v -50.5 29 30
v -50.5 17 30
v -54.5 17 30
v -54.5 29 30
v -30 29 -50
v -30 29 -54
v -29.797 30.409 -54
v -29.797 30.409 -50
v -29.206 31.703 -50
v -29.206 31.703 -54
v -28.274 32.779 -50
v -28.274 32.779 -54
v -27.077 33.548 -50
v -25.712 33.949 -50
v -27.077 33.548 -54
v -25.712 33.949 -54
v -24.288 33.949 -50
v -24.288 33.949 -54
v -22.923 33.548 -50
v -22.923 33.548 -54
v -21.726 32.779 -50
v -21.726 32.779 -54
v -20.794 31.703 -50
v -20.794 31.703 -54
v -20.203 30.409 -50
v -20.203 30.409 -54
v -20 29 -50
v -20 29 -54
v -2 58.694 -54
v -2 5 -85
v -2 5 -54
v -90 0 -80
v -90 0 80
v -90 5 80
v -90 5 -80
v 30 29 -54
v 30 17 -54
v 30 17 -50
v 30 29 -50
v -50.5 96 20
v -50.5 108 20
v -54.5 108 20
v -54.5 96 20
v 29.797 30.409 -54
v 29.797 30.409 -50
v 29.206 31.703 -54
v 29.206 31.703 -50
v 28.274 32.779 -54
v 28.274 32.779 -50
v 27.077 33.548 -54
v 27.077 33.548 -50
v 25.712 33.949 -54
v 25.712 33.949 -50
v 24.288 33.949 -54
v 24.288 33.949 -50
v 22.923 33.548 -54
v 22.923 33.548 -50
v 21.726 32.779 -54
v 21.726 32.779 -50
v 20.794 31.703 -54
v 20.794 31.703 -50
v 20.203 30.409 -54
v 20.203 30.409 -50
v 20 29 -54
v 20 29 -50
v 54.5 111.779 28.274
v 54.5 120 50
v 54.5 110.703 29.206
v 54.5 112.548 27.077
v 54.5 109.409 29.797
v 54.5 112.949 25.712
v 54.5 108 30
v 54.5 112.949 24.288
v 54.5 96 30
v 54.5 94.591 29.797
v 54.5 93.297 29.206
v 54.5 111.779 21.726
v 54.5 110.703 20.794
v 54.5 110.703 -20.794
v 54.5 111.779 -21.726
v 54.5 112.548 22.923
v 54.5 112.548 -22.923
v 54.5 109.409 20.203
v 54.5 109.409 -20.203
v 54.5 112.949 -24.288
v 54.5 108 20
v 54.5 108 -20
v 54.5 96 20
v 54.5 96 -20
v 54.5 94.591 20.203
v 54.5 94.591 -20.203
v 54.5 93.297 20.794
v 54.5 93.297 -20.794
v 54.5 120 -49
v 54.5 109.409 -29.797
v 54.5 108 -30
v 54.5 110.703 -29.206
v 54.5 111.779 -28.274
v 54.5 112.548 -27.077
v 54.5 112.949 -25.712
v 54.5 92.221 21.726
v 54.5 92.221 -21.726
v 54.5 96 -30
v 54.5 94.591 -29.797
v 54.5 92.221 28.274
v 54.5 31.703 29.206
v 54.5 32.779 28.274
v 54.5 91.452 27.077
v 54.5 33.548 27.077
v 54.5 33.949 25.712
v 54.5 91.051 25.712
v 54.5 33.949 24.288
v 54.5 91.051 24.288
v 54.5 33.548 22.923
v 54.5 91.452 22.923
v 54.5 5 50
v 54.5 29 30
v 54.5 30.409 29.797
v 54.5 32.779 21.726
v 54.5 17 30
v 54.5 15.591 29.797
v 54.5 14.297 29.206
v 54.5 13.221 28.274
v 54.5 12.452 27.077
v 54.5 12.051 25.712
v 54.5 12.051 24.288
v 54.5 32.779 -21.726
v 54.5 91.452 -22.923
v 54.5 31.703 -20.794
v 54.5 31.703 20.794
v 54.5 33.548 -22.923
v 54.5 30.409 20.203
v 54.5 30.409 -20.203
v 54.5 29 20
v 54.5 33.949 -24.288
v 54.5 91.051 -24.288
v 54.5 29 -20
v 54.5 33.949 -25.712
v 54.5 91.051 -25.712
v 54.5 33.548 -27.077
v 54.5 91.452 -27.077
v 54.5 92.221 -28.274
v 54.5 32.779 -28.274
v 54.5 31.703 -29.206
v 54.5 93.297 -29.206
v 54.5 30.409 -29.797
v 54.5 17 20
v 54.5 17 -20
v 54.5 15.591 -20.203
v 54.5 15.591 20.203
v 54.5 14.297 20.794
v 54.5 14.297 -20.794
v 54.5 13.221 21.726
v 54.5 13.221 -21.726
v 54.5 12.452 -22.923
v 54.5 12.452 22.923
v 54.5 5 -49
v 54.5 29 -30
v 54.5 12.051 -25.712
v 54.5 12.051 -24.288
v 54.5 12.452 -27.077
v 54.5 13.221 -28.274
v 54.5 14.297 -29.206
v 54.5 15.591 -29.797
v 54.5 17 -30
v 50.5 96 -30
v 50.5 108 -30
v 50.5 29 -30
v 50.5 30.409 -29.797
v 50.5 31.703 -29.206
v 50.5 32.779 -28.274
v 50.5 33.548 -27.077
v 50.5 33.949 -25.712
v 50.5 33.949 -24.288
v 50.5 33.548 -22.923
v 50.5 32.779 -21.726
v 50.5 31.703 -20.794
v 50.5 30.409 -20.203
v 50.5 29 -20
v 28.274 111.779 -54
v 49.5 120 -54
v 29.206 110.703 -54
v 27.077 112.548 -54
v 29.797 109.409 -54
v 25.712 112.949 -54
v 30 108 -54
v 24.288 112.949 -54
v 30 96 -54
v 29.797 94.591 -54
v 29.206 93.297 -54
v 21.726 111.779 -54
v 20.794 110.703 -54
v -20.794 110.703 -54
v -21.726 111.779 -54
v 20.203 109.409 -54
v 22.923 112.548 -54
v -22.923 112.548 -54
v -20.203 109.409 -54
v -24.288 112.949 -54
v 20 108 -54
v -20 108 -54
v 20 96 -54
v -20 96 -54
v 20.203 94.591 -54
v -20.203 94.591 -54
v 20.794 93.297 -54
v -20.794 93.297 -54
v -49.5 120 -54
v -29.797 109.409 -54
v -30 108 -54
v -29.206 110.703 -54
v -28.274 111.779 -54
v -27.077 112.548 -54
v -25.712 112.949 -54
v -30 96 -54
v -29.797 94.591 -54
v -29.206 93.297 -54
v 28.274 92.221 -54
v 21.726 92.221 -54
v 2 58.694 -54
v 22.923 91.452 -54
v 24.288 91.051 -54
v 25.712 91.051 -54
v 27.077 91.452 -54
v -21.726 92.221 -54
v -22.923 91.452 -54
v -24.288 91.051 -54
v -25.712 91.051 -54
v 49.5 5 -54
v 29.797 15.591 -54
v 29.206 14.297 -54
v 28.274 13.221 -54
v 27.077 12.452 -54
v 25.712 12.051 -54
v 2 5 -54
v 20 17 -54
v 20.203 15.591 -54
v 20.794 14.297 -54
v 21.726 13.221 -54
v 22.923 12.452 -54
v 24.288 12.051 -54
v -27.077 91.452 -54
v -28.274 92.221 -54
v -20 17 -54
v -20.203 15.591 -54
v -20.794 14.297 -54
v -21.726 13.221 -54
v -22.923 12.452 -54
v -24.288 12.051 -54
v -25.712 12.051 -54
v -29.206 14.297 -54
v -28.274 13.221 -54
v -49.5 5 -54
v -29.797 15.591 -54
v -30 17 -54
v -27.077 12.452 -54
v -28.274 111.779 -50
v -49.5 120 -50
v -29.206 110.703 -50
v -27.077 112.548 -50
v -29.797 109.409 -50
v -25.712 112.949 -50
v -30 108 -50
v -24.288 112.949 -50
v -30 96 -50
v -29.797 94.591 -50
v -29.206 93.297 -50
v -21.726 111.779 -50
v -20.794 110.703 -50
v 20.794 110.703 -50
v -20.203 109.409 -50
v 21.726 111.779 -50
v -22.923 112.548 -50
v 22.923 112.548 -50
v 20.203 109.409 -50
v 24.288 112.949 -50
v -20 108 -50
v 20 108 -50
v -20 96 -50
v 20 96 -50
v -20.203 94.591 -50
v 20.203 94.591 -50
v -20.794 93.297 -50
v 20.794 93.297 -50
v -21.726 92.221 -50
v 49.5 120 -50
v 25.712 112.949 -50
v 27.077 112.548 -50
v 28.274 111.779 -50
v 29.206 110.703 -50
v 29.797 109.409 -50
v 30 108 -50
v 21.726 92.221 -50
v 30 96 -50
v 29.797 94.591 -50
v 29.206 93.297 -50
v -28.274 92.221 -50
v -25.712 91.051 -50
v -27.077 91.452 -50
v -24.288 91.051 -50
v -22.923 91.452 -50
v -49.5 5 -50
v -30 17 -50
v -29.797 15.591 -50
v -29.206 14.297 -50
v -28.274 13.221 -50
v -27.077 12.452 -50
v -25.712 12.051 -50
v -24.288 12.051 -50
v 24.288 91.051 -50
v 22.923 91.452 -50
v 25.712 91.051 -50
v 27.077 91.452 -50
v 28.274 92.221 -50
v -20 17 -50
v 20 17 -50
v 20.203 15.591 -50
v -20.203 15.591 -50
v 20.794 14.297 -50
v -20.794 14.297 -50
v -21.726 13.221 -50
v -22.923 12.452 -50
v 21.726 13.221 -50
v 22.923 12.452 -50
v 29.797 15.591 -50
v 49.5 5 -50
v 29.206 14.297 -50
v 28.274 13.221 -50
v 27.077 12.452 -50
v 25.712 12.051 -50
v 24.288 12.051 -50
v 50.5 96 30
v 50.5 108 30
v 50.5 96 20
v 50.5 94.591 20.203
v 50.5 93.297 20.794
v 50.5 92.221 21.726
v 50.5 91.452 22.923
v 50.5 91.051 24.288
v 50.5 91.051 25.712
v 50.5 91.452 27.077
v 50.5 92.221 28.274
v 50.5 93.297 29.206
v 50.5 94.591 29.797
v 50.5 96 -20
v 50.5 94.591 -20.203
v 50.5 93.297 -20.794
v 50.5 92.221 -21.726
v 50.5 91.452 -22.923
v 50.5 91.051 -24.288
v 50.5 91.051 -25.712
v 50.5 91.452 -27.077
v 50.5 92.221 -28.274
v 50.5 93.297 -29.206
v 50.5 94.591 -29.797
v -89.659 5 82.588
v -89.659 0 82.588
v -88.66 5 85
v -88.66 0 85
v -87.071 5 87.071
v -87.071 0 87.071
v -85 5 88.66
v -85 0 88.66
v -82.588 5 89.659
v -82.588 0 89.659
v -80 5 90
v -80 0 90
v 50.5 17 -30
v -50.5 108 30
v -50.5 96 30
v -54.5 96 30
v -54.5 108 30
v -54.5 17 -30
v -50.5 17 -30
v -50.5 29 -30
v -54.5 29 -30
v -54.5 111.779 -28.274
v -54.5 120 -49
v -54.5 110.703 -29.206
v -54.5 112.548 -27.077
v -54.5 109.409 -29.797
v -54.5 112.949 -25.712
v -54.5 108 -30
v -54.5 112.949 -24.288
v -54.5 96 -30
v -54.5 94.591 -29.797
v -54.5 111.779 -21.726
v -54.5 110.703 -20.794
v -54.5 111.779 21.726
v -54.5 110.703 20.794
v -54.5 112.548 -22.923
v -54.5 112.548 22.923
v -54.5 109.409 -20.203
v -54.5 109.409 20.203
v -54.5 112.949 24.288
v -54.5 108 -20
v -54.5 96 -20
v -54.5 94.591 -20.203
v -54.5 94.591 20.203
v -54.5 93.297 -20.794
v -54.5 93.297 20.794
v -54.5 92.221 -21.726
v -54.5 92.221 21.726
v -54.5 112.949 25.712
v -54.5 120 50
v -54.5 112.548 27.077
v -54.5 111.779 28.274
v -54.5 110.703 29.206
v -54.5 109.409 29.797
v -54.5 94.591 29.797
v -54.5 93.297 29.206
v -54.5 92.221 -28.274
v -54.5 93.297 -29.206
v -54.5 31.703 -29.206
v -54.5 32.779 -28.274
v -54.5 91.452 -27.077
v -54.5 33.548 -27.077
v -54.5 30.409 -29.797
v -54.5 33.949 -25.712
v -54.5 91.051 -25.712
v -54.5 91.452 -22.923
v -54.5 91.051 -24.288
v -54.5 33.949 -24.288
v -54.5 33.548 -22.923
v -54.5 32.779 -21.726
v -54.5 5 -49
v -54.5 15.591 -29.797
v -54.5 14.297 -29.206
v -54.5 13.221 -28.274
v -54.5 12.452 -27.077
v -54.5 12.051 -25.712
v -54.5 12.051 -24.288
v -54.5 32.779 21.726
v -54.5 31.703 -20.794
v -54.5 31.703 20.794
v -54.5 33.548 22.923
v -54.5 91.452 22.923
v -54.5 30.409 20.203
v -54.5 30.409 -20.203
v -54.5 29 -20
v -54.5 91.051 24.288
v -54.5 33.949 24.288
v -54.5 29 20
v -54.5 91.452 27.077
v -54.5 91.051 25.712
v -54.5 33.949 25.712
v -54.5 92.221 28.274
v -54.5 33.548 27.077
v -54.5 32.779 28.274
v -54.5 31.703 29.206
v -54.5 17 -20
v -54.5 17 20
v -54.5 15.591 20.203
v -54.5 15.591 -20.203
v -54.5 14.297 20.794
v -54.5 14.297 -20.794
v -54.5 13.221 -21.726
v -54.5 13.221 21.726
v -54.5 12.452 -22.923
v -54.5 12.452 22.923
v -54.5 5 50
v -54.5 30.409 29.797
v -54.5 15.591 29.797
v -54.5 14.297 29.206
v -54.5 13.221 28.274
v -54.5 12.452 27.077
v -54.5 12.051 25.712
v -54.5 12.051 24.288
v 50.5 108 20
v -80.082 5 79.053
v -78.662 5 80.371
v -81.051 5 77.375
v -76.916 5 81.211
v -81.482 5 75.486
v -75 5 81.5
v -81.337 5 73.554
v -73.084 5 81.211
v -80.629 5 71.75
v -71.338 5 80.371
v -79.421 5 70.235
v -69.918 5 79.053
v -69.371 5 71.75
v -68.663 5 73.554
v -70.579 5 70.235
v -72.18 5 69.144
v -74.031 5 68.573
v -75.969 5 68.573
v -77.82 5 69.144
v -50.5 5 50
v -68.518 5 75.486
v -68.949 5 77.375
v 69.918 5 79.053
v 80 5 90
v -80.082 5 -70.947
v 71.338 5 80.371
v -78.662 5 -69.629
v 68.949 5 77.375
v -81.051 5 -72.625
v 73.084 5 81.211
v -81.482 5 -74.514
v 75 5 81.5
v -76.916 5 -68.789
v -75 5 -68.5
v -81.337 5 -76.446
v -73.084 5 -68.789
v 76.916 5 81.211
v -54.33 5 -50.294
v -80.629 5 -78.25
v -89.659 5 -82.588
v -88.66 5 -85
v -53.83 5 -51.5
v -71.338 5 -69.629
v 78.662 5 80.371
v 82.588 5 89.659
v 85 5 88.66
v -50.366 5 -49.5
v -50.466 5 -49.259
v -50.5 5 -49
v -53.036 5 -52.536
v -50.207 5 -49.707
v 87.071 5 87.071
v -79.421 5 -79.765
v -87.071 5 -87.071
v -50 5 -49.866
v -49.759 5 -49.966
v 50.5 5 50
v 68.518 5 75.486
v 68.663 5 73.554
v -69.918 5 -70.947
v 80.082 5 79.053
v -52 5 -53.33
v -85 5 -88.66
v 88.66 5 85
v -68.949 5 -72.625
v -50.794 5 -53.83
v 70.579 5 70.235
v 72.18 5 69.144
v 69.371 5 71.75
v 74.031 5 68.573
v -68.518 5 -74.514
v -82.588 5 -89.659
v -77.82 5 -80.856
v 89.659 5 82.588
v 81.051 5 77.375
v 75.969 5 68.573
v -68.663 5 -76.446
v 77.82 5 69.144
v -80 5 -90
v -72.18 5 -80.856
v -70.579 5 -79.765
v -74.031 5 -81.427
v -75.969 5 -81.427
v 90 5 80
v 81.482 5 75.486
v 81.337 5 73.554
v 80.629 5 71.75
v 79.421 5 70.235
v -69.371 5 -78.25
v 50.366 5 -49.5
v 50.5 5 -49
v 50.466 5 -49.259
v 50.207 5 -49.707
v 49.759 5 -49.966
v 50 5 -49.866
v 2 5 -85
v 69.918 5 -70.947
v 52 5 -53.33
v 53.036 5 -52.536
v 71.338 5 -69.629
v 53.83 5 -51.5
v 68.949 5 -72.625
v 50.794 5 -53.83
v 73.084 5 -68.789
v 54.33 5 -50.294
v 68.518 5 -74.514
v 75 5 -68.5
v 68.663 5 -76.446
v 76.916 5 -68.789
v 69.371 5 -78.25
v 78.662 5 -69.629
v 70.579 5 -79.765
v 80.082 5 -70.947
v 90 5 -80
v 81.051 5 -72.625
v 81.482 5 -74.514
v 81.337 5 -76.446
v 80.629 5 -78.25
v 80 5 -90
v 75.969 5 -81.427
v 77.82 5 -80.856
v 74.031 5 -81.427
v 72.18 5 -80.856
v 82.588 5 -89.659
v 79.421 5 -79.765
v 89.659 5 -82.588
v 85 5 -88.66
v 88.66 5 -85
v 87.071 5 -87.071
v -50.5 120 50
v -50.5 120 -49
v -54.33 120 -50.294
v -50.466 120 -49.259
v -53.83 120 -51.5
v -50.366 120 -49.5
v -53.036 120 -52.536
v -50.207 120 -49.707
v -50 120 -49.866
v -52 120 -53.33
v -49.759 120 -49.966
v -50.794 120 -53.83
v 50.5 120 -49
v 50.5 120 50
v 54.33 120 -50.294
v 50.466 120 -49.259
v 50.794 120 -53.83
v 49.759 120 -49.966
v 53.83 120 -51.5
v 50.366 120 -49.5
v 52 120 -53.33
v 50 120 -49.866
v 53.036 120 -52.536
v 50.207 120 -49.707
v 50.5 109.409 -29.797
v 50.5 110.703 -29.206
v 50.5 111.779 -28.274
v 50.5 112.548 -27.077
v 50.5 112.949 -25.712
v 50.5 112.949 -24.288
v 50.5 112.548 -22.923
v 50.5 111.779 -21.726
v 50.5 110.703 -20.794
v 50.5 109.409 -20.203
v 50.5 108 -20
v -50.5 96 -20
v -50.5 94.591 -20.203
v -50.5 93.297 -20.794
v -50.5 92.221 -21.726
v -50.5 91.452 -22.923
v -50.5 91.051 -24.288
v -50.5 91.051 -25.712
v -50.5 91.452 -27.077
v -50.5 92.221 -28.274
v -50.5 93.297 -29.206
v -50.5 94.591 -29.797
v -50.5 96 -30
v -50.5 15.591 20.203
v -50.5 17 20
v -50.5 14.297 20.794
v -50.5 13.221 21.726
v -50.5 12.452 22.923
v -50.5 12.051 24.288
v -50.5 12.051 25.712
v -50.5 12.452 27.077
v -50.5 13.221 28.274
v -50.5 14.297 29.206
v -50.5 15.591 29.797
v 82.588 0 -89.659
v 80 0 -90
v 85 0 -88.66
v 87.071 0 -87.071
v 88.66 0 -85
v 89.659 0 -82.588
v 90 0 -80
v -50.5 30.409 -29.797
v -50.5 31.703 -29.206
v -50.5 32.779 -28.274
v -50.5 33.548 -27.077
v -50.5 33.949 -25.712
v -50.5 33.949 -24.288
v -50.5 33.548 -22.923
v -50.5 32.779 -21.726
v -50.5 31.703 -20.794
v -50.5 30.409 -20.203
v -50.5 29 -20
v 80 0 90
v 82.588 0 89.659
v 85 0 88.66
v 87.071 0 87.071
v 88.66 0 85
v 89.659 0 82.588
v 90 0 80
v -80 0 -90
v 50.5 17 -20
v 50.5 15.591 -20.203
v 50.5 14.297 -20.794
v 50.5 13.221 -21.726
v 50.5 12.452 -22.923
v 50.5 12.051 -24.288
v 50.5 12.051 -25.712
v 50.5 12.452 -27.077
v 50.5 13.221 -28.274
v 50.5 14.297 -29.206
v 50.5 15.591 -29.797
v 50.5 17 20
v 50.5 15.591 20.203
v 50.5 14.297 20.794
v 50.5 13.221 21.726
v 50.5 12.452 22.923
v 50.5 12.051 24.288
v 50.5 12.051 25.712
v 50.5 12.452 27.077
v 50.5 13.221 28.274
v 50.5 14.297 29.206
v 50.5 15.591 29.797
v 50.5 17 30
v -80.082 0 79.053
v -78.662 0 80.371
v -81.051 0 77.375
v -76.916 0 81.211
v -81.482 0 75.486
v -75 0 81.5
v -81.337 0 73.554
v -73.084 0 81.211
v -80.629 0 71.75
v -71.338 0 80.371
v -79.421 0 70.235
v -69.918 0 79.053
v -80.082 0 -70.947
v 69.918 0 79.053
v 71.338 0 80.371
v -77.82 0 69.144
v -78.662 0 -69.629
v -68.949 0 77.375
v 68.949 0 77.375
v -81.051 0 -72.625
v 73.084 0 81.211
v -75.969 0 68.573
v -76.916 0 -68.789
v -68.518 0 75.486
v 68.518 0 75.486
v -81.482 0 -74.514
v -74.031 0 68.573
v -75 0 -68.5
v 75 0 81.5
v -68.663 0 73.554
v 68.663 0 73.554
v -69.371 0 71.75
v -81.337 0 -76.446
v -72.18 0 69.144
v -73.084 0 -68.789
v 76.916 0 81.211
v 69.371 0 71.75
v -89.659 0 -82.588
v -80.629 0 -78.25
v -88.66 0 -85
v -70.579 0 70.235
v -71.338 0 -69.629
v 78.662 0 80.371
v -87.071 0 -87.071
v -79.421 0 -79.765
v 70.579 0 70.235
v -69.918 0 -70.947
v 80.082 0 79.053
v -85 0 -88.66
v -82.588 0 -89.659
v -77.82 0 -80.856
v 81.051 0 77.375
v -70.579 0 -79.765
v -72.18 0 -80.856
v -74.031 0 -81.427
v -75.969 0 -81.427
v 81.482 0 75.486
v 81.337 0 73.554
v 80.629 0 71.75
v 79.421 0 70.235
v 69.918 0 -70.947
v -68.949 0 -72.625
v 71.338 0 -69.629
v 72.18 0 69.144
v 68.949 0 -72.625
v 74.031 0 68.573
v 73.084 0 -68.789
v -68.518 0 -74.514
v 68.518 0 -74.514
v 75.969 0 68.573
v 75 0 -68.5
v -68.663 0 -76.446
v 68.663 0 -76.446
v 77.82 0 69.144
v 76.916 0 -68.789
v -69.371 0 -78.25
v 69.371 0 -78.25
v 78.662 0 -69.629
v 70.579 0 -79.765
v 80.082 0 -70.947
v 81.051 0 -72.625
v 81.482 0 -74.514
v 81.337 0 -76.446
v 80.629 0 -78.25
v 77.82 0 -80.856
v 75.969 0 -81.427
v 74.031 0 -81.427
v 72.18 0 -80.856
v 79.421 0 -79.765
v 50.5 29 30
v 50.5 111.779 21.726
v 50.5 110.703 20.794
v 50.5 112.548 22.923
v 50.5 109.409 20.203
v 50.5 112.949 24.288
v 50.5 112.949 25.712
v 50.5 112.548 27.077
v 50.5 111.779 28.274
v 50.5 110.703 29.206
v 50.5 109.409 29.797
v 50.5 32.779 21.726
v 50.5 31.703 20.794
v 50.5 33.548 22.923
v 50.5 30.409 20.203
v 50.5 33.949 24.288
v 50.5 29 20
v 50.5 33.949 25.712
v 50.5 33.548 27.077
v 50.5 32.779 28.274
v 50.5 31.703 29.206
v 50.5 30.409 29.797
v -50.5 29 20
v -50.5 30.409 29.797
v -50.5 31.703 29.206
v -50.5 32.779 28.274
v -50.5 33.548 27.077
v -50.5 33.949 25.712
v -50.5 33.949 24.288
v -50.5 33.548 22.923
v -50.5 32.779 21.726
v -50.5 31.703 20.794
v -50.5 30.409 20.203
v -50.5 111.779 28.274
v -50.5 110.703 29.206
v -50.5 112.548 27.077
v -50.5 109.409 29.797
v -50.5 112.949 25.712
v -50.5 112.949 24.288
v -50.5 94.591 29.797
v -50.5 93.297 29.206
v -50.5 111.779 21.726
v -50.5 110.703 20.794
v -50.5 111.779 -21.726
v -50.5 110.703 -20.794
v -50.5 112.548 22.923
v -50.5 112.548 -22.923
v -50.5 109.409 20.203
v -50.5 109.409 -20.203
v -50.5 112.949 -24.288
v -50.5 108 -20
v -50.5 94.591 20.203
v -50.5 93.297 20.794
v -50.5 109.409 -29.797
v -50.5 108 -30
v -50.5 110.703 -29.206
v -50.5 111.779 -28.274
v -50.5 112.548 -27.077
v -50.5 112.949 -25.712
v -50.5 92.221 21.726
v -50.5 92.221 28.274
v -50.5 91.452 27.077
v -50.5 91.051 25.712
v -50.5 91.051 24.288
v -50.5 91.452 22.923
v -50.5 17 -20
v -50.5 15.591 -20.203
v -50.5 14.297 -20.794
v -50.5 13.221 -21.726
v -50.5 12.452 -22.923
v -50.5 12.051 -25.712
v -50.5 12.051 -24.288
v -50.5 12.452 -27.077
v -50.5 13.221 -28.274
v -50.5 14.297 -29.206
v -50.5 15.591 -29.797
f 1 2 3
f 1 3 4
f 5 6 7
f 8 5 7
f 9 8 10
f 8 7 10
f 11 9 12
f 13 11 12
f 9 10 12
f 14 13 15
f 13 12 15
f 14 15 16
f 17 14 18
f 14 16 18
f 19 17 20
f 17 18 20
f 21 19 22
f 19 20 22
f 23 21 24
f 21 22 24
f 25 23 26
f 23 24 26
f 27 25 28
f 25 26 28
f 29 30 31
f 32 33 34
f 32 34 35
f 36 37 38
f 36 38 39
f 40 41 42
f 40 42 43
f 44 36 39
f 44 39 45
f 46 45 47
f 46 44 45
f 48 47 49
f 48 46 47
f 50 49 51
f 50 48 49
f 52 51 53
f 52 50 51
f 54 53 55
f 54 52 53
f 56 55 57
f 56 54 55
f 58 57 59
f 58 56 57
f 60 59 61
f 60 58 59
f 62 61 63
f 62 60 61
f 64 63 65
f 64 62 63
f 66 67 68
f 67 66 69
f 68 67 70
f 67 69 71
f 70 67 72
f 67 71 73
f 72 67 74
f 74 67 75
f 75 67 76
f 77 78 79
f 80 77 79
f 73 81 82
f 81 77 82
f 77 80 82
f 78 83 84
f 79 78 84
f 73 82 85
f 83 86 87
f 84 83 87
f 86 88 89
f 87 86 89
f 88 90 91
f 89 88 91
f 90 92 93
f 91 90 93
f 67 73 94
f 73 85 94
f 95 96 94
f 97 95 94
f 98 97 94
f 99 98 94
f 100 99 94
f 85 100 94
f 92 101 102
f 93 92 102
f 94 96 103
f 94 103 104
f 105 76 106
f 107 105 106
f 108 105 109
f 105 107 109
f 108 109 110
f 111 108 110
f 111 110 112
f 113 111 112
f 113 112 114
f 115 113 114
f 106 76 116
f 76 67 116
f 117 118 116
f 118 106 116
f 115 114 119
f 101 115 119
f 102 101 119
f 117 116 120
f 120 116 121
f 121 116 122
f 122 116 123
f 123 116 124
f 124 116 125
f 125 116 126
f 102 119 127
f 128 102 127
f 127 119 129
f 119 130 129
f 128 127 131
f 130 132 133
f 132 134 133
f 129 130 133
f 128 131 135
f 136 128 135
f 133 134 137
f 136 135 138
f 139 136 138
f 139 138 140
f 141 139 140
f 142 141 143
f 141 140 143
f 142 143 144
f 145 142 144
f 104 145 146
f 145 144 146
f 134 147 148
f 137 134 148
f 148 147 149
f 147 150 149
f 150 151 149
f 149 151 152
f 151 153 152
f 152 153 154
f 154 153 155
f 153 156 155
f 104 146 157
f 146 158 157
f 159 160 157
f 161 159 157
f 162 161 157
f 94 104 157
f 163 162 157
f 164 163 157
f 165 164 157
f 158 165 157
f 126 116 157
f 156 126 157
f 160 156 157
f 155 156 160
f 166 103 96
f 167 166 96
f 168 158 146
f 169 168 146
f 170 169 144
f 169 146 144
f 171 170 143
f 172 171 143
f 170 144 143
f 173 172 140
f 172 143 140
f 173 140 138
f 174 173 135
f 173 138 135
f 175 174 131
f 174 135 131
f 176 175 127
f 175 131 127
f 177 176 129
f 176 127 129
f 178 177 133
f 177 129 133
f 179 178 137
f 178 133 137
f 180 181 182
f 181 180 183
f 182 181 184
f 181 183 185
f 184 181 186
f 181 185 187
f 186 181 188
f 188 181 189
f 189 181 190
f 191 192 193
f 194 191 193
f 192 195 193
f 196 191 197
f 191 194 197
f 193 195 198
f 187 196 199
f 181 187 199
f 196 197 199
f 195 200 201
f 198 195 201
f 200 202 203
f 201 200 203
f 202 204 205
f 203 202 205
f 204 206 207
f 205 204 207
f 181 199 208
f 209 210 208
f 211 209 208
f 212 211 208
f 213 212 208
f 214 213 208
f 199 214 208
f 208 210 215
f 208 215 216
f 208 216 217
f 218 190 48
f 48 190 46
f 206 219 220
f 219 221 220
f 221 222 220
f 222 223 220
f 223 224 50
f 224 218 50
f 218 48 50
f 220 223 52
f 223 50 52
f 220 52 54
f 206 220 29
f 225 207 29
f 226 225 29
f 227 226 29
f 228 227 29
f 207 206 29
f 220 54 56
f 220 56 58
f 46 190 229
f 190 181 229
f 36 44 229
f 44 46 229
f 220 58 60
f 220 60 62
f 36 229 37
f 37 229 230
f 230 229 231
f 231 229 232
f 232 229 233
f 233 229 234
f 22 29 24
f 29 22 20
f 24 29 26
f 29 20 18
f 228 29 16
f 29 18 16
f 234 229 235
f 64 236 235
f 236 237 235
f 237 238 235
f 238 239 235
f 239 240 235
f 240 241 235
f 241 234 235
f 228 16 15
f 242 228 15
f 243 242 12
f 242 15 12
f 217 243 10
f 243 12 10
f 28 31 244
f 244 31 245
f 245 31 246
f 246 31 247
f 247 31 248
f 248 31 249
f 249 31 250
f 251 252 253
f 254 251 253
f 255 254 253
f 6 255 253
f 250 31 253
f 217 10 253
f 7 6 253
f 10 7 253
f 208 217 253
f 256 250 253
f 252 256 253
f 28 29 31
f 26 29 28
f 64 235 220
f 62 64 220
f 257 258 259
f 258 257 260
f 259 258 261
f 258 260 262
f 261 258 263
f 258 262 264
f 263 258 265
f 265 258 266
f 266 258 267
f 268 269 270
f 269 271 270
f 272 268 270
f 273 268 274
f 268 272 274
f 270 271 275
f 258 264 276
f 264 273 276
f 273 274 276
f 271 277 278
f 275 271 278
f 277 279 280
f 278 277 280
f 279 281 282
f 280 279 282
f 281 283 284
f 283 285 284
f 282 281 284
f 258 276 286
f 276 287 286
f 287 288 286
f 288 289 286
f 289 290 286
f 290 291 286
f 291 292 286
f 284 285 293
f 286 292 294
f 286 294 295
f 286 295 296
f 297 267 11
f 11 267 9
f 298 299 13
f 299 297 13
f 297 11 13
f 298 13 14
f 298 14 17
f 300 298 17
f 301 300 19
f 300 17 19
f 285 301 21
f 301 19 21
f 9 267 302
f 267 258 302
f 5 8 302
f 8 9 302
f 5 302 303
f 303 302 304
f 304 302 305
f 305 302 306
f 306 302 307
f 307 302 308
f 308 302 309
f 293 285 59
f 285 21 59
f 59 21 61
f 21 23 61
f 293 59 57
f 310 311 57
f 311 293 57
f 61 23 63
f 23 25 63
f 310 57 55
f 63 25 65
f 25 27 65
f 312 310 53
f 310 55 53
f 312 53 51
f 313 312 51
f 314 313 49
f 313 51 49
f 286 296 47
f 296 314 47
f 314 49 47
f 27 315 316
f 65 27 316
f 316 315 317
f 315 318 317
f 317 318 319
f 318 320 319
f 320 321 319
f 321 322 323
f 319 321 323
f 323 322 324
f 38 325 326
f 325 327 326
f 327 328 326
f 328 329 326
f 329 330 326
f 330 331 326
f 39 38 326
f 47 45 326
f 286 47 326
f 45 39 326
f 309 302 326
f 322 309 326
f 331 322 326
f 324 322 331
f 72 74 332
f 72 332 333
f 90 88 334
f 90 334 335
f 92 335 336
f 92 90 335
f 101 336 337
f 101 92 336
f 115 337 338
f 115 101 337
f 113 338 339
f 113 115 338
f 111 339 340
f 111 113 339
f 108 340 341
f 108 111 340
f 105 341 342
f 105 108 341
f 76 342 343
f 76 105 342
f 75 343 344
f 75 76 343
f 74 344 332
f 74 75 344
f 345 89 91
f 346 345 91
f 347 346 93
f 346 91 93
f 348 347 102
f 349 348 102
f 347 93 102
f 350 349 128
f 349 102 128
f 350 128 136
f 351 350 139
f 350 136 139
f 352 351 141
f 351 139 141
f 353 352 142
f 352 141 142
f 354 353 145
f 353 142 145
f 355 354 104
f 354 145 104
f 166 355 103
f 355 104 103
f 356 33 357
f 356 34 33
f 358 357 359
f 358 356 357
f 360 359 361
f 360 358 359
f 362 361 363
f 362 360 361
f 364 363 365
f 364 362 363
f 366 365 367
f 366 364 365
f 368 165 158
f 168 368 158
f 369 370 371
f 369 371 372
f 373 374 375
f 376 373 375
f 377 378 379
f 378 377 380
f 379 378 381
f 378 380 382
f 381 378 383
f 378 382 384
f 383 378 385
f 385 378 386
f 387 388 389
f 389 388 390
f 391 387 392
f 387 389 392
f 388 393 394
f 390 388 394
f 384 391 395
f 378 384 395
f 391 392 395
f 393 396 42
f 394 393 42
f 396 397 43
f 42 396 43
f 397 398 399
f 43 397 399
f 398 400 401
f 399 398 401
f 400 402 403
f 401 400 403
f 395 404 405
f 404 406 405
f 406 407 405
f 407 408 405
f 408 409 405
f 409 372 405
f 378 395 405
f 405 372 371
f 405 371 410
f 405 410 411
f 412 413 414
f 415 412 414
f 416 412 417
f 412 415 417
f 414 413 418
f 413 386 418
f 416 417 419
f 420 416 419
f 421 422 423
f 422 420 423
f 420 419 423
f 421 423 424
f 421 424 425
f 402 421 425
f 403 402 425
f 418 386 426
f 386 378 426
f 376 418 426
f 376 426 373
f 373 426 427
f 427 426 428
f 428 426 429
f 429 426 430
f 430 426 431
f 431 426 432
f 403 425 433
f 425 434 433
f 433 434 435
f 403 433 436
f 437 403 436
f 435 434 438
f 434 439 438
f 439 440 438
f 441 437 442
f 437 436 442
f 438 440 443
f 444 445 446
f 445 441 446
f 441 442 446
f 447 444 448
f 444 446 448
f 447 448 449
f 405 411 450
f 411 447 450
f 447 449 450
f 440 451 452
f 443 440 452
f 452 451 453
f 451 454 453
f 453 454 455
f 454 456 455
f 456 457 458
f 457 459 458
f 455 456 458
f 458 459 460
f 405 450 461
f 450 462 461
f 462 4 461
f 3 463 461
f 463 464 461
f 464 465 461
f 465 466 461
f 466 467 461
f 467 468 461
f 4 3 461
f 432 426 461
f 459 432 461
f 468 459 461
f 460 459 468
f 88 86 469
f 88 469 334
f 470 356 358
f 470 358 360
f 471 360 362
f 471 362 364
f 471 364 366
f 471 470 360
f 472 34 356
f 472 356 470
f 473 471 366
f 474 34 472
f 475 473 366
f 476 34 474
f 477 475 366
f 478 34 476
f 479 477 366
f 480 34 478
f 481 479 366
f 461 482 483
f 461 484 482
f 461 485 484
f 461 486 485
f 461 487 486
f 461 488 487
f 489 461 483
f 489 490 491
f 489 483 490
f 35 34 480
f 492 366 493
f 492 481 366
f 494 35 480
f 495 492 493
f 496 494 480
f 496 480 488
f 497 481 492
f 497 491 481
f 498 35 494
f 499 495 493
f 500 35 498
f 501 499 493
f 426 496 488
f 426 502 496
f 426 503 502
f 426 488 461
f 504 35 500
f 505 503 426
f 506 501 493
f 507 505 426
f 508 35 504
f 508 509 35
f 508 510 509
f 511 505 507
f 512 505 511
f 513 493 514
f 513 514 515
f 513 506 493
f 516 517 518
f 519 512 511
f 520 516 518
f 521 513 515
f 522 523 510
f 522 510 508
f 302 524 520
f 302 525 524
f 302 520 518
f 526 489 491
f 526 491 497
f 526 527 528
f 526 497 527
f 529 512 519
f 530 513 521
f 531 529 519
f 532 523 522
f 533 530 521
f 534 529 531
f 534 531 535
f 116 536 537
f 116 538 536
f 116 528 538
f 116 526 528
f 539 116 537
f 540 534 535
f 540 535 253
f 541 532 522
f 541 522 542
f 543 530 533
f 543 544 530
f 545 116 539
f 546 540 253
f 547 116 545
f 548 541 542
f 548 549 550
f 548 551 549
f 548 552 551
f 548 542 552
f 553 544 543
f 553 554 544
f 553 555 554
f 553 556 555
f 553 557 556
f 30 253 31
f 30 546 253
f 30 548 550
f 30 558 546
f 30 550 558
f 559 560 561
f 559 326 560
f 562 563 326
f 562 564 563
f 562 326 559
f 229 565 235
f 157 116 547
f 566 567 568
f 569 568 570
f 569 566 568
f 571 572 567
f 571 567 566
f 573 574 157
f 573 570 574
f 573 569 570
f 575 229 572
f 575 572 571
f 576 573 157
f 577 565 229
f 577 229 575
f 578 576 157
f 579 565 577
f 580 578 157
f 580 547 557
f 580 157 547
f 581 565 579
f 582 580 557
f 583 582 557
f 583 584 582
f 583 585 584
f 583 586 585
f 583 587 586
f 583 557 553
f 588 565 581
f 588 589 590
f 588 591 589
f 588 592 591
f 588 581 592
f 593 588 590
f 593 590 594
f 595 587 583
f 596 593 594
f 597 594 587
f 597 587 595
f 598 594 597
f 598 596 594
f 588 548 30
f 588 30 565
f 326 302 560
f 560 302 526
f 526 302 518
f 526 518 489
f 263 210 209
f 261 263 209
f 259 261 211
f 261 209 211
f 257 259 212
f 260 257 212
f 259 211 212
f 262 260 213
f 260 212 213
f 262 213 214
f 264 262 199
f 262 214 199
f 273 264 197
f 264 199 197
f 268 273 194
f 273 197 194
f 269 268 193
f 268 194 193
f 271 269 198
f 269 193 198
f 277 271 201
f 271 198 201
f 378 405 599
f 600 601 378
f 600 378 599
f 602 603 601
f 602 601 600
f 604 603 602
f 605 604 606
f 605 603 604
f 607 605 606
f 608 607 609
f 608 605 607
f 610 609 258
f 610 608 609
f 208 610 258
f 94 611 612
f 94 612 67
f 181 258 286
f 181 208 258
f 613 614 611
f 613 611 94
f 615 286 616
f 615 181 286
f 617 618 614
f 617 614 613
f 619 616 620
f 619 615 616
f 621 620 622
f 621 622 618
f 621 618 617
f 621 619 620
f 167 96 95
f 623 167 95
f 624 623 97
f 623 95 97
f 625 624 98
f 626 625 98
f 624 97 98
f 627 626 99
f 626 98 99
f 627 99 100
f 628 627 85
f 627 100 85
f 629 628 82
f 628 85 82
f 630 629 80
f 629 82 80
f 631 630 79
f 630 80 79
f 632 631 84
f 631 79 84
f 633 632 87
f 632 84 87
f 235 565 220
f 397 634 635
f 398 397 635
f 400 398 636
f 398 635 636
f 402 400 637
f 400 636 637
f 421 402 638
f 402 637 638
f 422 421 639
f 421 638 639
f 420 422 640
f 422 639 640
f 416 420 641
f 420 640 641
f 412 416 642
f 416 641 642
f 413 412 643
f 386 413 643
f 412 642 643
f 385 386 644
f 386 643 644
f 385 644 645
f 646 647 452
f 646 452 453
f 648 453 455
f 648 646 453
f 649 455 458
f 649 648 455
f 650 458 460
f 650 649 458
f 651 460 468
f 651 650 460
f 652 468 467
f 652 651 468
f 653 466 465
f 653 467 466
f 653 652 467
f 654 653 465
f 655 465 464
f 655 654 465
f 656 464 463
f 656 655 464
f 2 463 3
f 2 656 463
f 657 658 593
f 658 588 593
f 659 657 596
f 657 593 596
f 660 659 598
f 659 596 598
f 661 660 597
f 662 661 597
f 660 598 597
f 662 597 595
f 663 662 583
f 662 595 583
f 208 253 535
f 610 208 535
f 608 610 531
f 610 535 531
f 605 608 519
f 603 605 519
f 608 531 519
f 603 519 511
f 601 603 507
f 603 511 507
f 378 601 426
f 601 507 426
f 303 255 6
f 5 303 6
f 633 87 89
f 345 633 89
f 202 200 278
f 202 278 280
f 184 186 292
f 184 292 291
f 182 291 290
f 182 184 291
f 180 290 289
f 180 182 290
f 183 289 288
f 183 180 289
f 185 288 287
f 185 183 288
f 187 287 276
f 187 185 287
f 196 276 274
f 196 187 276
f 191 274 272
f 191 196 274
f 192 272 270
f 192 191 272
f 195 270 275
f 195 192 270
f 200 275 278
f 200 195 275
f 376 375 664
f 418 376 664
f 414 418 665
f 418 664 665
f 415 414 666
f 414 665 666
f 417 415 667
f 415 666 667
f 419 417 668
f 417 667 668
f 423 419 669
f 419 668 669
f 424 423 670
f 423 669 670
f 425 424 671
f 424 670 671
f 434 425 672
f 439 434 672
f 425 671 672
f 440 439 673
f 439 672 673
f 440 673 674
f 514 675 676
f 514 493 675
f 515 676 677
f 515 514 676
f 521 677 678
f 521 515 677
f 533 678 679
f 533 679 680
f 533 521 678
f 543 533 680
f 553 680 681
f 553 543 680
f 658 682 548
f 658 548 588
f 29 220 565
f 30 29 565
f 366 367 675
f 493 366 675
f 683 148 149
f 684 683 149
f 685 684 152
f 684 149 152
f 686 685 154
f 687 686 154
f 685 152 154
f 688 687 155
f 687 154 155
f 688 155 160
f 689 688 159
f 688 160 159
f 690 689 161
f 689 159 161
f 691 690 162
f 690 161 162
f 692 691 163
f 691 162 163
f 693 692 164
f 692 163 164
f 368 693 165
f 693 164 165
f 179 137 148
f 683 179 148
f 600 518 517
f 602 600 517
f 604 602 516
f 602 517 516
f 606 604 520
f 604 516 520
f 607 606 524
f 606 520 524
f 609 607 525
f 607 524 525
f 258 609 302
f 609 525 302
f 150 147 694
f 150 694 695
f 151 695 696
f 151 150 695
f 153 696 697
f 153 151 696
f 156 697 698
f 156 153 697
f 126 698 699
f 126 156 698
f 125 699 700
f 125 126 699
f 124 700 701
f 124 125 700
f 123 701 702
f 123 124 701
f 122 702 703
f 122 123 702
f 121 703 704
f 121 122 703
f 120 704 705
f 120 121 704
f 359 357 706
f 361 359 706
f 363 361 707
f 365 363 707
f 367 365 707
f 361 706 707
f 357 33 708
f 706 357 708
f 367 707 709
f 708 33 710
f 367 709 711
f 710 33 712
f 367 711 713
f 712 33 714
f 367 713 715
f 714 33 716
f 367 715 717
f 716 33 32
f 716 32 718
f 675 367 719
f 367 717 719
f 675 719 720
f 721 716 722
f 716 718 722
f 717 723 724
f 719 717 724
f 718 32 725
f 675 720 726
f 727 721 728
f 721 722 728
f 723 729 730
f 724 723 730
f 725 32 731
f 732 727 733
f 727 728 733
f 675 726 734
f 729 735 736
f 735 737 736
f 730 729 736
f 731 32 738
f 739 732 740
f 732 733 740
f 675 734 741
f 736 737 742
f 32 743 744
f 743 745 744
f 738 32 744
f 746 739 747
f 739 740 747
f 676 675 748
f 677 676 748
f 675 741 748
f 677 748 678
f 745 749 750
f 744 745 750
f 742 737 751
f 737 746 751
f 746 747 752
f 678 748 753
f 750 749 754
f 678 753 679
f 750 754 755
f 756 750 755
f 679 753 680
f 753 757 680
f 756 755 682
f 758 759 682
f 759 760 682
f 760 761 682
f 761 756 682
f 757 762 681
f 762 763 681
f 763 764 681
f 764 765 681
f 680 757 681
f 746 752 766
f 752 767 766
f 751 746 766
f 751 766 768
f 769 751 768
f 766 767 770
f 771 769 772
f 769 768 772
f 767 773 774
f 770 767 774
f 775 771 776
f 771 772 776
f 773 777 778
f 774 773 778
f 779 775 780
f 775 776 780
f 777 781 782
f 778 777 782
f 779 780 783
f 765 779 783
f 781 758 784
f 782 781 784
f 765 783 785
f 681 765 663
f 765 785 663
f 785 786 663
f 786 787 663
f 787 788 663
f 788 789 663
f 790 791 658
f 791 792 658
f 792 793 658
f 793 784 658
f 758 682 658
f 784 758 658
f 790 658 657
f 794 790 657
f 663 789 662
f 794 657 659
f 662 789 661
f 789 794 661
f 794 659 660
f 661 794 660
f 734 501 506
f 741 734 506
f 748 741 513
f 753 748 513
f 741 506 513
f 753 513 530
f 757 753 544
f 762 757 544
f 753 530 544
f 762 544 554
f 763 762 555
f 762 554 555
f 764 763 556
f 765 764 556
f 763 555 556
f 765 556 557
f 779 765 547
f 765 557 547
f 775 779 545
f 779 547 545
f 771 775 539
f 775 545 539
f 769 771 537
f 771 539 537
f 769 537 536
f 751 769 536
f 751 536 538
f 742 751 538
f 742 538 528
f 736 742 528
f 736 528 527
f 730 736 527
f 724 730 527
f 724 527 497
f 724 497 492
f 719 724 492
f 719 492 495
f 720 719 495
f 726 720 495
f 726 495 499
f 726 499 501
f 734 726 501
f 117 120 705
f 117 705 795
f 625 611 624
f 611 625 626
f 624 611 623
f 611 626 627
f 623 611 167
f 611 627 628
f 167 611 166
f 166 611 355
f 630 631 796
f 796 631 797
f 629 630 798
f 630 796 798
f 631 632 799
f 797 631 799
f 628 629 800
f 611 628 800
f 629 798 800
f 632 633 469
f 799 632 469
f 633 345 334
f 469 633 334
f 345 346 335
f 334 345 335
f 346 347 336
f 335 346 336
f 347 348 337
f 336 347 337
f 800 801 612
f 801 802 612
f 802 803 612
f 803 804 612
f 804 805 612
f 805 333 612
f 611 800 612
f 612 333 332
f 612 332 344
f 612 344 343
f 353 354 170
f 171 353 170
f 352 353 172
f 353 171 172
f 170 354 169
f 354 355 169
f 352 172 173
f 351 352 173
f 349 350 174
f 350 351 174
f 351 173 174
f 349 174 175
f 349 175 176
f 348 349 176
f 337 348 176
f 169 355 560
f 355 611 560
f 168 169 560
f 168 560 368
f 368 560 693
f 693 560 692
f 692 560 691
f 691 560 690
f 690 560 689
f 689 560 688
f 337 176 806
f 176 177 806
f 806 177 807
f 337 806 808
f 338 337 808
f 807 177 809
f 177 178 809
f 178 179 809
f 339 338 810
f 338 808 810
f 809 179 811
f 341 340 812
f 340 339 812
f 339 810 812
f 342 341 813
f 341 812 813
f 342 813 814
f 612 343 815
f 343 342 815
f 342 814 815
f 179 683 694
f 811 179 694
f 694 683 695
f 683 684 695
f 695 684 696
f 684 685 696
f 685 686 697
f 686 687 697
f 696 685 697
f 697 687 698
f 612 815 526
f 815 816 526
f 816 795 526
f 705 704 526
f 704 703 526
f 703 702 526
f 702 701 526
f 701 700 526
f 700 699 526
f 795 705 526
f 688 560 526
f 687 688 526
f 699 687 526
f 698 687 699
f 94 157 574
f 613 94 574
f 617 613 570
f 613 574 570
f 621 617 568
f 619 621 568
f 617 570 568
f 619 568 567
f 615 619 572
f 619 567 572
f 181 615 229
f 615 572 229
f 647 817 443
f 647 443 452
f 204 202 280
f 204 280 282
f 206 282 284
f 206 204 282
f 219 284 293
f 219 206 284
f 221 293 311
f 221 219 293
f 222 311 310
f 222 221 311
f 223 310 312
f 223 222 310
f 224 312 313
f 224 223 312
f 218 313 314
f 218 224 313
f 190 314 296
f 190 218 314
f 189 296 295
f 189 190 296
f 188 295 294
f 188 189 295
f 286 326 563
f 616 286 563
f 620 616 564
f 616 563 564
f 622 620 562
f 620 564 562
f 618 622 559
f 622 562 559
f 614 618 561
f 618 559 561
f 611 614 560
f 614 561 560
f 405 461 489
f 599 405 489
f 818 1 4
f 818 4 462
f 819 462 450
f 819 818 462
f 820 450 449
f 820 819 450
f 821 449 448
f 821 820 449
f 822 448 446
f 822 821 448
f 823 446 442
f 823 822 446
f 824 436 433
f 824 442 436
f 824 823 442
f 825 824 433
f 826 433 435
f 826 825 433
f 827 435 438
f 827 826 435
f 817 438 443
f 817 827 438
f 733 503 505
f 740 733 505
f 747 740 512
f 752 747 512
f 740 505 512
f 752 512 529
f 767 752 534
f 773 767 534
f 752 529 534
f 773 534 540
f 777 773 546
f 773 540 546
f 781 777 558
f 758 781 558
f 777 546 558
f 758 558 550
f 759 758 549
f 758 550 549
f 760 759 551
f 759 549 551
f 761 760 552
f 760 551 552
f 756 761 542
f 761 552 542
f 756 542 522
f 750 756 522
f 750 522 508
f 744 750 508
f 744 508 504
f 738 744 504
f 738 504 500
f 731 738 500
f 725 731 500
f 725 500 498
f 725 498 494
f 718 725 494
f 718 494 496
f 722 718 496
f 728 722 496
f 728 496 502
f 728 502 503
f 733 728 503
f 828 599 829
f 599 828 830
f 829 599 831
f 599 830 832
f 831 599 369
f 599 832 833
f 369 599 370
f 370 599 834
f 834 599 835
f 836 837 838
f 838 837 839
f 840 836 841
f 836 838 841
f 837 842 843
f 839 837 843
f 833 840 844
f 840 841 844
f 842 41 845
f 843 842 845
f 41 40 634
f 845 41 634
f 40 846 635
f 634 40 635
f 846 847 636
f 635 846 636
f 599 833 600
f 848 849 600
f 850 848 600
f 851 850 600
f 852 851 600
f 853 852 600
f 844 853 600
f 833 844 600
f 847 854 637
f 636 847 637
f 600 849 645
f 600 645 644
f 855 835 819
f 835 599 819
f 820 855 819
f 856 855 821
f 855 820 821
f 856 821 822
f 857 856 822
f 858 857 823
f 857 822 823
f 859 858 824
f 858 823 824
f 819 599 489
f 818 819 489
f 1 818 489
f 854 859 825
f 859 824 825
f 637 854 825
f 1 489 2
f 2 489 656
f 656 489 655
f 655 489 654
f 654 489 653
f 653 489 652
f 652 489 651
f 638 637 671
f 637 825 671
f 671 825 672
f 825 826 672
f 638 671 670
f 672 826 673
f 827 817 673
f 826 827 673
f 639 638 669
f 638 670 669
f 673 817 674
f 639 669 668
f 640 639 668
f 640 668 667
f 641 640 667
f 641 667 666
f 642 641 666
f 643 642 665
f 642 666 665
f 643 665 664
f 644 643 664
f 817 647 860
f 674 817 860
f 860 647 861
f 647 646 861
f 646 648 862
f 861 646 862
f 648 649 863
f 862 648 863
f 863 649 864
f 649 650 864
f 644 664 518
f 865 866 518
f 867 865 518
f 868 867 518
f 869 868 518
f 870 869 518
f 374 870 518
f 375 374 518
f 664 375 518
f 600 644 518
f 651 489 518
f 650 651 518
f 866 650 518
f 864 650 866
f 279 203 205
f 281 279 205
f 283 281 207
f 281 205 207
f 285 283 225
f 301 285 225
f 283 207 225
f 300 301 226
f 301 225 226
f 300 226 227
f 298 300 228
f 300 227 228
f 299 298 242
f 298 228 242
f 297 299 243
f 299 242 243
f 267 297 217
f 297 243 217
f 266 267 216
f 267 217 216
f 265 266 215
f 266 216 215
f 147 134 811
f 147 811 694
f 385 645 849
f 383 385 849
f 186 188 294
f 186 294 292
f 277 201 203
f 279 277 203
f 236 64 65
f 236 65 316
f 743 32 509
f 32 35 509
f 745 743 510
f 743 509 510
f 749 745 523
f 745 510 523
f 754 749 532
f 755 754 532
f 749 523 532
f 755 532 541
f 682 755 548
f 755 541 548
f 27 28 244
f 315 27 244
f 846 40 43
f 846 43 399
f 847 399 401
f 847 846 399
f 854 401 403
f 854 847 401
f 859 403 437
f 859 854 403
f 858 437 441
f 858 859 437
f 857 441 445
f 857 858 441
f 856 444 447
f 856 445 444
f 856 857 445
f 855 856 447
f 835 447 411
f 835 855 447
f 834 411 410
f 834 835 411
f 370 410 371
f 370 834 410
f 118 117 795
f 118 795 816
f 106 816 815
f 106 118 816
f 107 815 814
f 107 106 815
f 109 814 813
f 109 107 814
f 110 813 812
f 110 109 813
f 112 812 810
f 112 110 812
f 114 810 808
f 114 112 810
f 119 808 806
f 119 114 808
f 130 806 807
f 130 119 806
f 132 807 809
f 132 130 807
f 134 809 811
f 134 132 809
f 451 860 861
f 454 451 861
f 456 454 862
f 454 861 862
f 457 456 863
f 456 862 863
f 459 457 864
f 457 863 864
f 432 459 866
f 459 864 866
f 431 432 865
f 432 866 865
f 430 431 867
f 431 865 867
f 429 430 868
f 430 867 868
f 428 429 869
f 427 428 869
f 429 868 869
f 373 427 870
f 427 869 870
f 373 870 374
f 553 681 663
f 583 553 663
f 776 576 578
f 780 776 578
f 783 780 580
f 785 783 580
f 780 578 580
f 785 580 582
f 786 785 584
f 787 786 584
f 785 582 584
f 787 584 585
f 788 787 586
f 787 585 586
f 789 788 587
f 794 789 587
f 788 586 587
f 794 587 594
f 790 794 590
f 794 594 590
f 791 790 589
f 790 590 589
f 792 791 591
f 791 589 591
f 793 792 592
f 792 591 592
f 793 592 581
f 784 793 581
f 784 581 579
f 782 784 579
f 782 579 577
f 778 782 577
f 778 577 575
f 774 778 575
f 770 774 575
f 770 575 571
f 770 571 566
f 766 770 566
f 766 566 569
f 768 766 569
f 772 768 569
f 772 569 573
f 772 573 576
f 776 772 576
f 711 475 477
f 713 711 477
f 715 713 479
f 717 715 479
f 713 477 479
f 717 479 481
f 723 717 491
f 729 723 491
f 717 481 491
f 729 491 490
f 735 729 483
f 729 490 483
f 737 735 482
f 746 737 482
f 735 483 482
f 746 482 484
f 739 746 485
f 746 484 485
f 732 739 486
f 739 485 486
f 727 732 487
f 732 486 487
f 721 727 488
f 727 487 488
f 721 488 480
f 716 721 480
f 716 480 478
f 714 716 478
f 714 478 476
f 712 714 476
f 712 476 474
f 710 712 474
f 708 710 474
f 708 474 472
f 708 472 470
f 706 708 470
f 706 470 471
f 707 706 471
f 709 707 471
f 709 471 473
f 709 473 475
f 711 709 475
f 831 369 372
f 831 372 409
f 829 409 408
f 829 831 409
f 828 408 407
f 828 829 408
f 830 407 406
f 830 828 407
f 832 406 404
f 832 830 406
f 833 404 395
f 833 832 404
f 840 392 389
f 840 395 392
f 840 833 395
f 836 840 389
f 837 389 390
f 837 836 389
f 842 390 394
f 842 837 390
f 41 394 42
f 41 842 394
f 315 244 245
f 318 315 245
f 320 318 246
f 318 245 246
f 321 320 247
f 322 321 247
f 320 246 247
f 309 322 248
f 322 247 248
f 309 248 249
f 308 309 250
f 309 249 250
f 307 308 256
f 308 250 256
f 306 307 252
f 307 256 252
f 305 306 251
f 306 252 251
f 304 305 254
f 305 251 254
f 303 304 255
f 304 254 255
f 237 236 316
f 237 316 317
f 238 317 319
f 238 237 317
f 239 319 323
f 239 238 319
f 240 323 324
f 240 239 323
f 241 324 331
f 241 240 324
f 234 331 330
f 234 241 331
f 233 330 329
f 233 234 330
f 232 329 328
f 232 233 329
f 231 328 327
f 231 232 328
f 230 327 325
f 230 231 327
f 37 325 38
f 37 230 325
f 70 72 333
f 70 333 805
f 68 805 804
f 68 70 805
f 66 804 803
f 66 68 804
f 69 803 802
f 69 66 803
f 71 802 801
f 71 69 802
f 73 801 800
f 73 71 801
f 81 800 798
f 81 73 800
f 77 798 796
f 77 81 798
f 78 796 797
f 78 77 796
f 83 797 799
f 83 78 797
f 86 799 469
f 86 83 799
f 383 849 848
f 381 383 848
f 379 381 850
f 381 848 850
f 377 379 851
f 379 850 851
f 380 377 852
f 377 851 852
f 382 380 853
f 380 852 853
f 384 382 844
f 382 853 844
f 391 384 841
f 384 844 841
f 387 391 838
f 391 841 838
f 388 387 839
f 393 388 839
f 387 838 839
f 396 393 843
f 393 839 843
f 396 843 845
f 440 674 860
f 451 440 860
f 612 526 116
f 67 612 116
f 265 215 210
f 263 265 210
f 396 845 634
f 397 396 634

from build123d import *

# Parameters (mm, degrees)
SKETCH_2_W          = 180
SKETCH_2_H          = 180
EXTRUDE_1_DEPTH     = 5
EXTRUDE_1_2_DEPTH   = 115
EXTRUDE_2_DEPTH     = 2
CUT_EXTRUDE_1_DEPTH = 145.5
SKETCH_6_R          = 6.5
CUT_EXTRUDE_2_DEPTH = 6
FILLET_1_R          = 10
CUT_EXTRUDE_3_REACH = 146


with BuildPart() as part:
    # Эскиз2 → Extrude 1 (new body)
    with BuildSketch(Plane(origin=(0, 0, 0), x_dir=(1, 0, 0), z_dir=(0, 1, 0))):
        Rectangle(SKETCH_2_W, SKETCH_2_H)
    extrude(amount=EXTRUDE_1_DEPTH)

    # Эскиз3 → Extrude 1 2 (add)
    with BuildSketch(Plane(origin=(0, 5, 0), x_dir=(1, 0, 0), z_dir=(0, 1, 0))):
        with BuildLine():
            Line((-50.5, -50), (-50.5, 49))
            ThreePointArc((-50.5, 49), (-50.207106781, 49.707106781), (-49.5, 50))
            Line((-49.5, 50), (49.5, 50))
            ThreePointArc((49.5, 50), (50.207106781, 49.707106781), (50.5, 49))
            Line((50.5, 49), (50.5, -50))
            Line((50.5, -50), (54.5, -50))
            Line((54.5, -50), (54.5, 49))
            ThreePointArc((54.5, 49), (53.035533906, 52.535533906), (49.5, 54))
            Line((49.5, 54), (-49.5, 54))
            ThreePointArc((-49.5, 54), (-53.035533906, 52.535533906), (-54.5, 49))
            Line((-54.5, 49), (-54.5, -50))
            Line((-54.5, -50), (-50.5, -50))
        make_face()
    extrude(amount=EXTRUDE_1_2_DEPTH)

    # Эскиз4 → Бобышка-Вытянуть2 (add, symmetric)
    with BuildSketch(Plane(origin=(0, 0, 0), x_dir=(0, 0, -1), z_dir=(1, 0, 0))):
        Polygon((54, 58.693575035), (85, 5), (54, 5), align=None)
    extrude(amount=EXTRUDE_2_DEPTH, both=True)

    # Эскиз5 → Вырез-Вытянуть1 (cut, through all)
    with BuildSketch(Plane(origin=(54.5, 0, 0), x_dir=(0, 0, -1), z_dir=(1, 0, 0))):
        with BuildLine():
            Line((-20, 108), (-20, 96))
            ThreePointArc((-20, 96), (-25, 91), (-30, 96))
            Line((-30, 96), (-30, 108))
            ThreePointArc((-30, 108), (-25, 113), (-20, 108))
        make_face()
        with BuildLine():
            Line((-20, 29), (-20, 17))
            ThreePointArc((-20, 17), (-25, 12), (-30, 17))
            Line((-30, 17), (-30, 29))
            ThreePointArc((-30, 29), (-25, 34), (-20, 29))
        make_face()
        with BuildLine():
            Line((20, 108), (20, 96))
            ThreePointArc((20, 96), (25, 91), (30, 96))
            Line((30, 96), (30, 108))
            ThreePointArc((30, 108), (25, 113), (20, 108))
        make_face()
        with BuildLine():
            Line((20, 29), (20, 17))
            ThreePointArc((20, 17), (25, 12), (30, 17))
            Line((30, 17), (30, 29))
            ThreePointArc((30, 29), (25, 34), (20, 29))
        make_face()
    extrude(amount=-CUT_EXTRUDE_1_DEPTH, mode=Mode.SUBTRACT)

    # Эскиз6 → Вырез-Вытянуть2 (cut, through all)
    with BuildSketch(Plane(origin=(0, 5, 0), x_dir=(1, 0, 0), z_dir=(0, 1, 0))):
        with Locations(Location((-75, 75, 0), (0, 0, 270))):  # turned: the seam where the file's is
            Circle(SKETCH_6_R)
        with Locations(Location((-75, -75, 0), (0, 0, 270))):  # turned: the seam where the file's is
            Circle(SKETCH_6_R)
        with Locations(Location((75, 75, 0), (0, 0, 270))):  # turned: the seam where the file's is
            Circle(SKETCH_6_R)
        with Locations(Location((75, -75, 0), (0, 0, 270))):  # turned: the seam where the file's is
            Circle(SKETCH_6_R)
    extrude(amount=-CUT_EXTRUDE_2_DEPTH, mode=Mode.SUBTRACT)

    # Скругление1
    fillet_1_edges = [part.edges().sort_by_distance(p)[0] for p in [
        (90, 2.5, 90),
        (-90, 2.5, 90),
        (-90, 2.5, -90),
        (90, 2.5, -90),
    ]]
    fillet(fillet_1_edges, radius=FILLET_1_R)

    # Эскиз8 → Вырез-Вытянуть3 (cut, up to next)
    with BuildSketch(Plane(origin=(0, 0, -54), x_dir=(-1, 0, 0), z_dir=(0, 0, -1)), mode=Mode.PRIVATE) as cut_extrude_3_sk1:
        with BuildLine():
            Line((-20, 108), (-20, 96))
            ThreePointArc((-20, 96), (-25, 91), (-30, 96))
            Line((-30, 96), (-30, 108))
            ThreePointArc((-30, 108), (-25, 113), (-20, 108))
        make_face()
    cut_extrude_3_tool1 = extrude(cut_extrude_3_sk1.sketch, amount=-CUT_EXTRUDE_3_REACH, mode=Mode.PRIVATE) & part.part
    add(cut_extrude_3_tool1.solids().sort_by_distance((25, 102, -54))[0], mode=Mode.SUBTRACT)
    # Эскиз8 → Вырез-Вытянуть3 (cut, up to next)
    with BuildSketch(Plane(origin=(0, 0, -54), x_dir=(-1, 0, 0), z_dir=(0, 0, -1)), mode=Mode.PRIVATE) as cut_extrude_3_sk2:
        with BuildLine():
            Line((-20, 29), (-20, 17))
            ThreePointArc((-20, 17), (-25, 12), (-30, 17))
            Line((-30, 17), (-30, 29))
            ThreePointArc((-30, 29), (-25, 34), (-20, 29))
        make_face()
    cut_extrude_3_tool2 = extrude(cut_extrude_3_sk2.sketch, amount=-CUT_EXTRUDE_3_REACH, mode=Mode.PRIVATE) & part.part
    add(cut_extrude_3_tool2.solids().sort_by_distance((25, 23, -54))[0], mode=Mode.SUBTRACT)
    # Эскиз8 → Вырез-Вытянуть3 (cut, up to next)
    with BuildSketch(Plane(origin=(0, 0, -54), x_dir=(-1, 0, 0), z_dir=(0, 0, -1)), mode=Mode.PRIVATE) as cut_extrude_3_sk3:
        with BuildLine():
            Line((20, 108), (20, 96))
            ThreePointArc((20, 96), (25, 91), (30, 96))
            Line((30, 96), (30, 108))
            ThreePointArc((30, 108), (25, 113), (20, 108))
        make_face()
    cut_extrude_3_tool3 = extrude(cut_extrude_3_sk3.sketch, amount=-CUT_EXTRUDE_3_REACH, mode=Mode.PRIVATE) & part.part
    add(cut_extrude_3_tool3.solids().sort_by_distance((-25, 102, -54))[0], mode=Mode.SUBTRACT)
    # Эскиз8 → Вырез-Вытянуть3 (cut, up to next)
    with BuildSketch(Plane(origin=(0, 0, -54), x_dir=(-1, 0, 0), z_dir=(0, 0, -1)), mode=Mode.PRIVATE) as cut_extrude_3_sk4:
        with BuildLine():
            Line((20, 29), (20, 17))
            ThreePointArc((20, 17), (25, 12), (30, 17))
            Line((30, 17), (30, 29))
            ThreePointArc((30, 29), (25, 34), (20, 29))
        make_face()
    cut_extrude_3_tool4 = extrude(cut_extrude_3_sk4.sketch, amount=-CUT_EXTRUDE_3_REACH, mode=Mode.PRIVATE) & part.part
    add(cut_extrude_3_tool4.solids().sort_by_distance((-25, 23, -54))[0], mode=Mode.SUBTRACT)


solid = part.part
